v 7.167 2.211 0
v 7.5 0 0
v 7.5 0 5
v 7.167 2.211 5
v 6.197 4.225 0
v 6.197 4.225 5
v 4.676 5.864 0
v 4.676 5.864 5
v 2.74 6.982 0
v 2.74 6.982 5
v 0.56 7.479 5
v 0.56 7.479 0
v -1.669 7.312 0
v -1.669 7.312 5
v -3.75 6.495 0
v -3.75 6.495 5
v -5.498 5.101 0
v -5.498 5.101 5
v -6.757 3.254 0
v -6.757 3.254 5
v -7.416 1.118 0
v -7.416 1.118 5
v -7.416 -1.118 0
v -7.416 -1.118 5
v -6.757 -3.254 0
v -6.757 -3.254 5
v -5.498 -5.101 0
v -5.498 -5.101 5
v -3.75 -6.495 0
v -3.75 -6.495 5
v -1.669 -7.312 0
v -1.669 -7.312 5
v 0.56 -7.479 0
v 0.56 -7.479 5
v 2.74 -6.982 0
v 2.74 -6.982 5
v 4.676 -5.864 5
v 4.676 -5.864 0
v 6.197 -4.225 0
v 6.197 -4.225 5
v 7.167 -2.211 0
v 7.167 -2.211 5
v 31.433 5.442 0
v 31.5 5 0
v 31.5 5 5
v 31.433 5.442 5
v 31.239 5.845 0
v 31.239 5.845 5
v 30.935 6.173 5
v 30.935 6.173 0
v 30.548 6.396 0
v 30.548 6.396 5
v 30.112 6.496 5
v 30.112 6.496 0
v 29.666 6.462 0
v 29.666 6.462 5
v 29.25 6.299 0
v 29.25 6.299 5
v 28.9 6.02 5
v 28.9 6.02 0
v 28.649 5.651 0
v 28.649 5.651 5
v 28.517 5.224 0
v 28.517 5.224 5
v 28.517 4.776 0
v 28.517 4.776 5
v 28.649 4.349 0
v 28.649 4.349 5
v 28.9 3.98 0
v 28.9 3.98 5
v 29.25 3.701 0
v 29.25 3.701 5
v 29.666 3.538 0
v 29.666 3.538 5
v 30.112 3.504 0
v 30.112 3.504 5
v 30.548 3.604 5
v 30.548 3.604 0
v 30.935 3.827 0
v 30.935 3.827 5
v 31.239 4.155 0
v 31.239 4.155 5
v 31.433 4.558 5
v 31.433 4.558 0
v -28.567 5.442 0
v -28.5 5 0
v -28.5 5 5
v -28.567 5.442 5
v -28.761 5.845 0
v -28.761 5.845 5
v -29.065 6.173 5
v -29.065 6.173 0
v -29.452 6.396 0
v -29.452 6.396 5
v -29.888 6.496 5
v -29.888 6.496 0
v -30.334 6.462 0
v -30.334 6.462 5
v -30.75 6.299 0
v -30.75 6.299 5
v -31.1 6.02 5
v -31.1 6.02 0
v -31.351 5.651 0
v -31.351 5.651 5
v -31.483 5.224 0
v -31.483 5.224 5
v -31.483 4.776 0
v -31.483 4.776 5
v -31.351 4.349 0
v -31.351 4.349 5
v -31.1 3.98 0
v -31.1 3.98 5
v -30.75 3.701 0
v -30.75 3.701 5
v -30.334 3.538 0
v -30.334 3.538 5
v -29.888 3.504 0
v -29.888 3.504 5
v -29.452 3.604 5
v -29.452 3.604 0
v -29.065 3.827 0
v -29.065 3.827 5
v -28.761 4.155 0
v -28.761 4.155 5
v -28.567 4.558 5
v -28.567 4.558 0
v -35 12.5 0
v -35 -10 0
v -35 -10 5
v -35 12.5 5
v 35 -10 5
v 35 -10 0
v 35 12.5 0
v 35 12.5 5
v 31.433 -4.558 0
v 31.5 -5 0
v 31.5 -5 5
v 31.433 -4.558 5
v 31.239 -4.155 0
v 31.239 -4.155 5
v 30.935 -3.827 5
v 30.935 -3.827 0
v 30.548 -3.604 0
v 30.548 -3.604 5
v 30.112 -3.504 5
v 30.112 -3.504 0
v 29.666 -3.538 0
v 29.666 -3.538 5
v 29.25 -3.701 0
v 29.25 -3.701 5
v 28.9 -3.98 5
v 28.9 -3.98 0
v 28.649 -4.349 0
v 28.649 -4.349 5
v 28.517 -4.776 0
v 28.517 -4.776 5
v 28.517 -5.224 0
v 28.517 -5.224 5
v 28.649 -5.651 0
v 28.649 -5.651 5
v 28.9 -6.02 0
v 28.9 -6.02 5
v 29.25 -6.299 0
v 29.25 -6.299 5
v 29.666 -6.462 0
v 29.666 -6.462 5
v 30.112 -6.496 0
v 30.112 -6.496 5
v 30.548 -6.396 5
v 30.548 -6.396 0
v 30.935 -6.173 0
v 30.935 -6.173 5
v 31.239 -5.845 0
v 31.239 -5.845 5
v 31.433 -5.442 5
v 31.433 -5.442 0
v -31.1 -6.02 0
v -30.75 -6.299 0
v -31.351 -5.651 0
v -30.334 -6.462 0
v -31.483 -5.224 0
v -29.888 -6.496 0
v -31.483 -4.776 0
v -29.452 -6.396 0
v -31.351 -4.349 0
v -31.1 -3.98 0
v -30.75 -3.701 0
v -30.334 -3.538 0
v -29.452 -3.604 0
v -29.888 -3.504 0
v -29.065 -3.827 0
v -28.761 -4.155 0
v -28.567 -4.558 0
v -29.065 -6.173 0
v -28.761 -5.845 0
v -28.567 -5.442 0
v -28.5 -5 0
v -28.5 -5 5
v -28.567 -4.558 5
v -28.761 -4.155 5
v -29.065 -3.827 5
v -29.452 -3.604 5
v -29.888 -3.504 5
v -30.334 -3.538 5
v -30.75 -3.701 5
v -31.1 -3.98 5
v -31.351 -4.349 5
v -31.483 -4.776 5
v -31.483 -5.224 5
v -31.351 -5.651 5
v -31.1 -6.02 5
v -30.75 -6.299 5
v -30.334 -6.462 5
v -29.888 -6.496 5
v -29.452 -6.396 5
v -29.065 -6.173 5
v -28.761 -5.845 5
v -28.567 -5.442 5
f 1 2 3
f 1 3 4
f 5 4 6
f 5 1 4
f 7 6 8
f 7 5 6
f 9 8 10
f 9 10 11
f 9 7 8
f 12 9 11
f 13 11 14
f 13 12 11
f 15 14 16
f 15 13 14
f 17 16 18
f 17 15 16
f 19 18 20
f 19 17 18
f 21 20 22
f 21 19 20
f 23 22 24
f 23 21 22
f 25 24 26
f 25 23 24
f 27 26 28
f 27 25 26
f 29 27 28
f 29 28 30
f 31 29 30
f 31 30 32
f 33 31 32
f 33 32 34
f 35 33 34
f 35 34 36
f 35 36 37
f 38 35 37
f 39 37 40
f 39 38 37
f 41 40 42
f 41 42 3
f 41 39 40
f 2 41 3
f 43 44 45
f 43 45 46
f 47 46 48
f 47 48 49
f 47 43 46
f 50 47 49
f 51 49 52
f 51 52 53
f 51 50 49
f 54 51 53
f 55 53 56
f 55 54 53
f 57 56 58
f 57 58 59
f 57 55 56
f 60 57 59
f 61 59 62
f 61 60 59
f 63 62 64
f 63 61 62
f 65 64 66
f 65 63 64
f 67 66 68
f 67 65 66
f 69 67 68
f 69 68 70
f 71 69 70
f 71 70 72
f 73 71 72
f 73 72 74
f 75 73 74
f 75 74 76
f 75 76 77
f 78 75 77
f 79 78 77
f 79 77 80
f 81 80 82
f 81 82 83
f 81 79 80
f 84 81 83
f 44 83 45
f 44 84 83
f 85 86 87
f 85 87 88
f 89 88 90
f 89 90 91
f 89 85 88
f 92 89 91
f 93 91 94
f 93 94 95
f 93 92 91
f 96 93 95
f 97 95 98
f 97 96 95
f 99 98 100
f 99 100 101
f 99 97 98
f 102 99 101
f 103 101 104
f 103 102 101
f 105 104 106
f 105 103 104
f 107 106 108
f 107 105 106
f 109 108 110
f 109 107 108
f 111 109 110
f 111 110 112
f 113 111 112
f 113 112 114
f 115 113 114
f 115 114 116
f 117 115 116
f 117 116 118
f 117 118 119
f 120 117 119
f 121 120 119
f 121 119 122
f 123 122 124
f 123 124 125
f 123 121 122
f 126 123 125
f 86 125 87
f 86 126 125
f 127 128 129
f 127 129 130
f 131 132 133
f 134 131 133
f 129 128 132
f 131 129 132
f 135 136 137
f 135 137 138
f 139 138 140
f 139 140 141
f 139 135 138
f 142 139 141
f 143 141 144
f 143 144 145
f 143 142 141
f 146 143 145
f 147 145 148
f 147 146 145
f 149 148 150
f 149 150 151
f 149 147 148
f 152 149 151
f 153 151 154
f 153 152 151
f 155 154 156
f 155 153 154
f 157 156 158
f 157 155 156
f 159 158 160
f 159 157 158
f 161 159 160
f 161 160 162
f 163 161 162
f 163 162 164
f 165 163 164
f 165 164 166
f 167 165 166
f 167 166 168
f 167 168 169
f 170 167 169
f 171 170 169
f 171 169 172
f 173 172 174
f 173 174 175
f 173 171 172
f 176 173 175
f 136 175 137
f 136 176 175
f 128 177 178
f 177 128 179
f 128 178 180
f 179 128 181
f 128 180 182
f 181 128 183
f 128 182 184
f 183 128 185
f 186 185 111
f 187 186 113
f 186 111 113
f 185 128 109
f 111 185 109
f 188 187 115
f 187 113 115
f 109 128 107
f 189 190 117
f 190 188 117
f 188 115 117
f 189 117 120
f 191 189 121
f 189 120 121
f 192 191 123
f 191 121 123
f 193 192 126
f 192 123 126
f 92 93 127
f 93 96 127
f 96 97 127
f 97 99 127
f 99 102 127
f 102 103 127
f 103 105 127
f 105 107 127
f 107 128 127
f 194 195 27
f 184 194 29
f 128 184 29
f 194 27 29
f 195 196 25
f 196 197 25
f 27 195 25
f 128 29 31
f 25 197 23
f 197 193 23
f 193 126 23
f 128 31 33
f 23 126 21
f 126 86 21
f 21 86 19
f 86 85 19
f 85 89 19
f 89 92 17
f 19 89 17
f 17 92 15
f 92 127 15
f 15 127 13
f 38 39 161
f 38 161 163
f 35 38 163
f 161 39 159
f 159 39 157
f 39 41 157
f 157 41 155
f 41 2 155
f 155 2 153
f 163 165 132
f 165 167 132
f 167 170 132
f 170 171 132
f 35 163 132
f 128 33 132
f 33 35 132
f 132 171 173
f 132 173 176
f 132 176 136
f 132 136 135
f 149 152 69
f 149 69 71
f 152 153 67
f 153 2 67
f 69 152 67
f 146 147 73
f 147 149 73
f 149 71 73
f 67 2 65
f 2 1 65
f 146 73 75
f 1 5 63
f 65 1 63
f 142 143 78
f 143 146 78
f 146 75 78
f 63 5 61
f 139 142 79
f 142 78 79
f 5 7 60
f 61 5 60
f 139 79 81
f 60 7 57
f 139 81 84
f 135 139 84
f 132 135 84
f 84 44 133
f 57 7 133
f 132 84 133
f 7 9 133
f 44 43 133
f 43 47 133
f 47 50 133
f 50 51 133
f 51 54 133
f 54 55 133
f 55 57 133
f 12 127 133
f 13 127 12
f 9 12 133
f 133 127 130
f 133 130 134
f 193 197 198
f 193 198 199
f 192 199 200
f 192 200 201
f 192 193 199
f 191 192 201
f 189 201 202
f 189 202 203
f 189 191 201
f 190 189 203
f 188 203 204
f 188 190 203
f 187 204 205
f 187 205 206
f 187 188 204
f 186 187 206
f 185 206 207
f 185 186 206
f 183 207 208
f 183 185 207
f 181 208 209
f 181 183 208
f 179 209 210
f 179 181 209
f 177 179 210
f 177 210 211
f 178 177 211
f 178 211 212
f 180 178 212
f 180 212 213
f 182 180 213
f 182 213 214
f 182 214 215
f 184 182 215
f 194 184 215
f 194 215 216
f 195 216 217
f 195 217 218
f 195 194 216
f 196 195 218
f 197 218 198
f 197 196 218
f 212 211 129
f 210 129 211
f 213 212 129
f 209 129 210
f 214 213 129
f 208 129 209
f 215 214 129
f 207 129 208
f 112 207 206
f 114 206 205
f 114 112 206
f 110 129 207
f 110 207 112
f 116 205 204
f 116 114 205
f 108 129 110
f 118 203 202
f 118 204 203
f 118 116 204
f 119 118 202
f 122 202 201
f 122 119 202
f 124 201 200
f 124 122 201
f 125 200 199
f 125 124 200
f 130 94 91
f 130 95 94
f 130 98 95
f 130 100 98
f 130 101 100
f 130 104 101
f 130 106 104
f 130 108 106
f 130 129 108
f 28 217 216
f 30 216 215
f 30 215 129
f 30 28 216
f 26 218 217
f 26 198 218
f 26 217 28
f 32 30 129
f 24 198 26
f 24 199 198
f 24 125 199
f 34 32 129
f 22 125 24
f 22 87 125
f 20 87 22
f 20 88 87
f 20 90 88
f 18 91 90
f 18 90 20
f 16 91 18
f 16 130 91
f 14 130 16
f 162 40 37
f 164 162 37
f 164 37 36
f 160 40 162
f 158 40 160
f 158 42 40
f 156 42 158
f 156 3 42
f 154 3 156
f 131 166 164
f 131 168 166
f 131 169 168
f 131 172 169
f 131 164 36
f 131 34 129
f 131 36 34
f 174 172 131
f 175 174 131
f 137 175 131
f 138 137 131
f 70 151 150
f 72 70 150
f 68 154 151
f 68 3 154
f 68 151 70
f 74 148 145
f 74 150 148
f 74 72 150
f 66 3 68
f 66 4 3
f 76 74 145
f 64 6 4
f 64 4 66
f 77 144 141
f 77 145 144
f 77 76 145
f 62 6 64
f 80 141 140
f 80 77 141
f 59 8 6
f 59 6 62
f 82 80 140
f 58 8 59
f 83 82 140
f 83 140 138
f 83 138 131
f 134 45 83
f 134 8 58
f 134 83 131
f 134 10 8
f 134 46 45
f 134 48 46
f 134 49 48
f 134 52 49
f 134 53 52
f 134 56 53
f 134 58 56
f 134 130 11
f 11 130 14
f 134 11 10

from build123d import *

# Parameters (mm, degrees)
ESQUISSE1_W        = 70
ESQUISSE1_H        = 22.5
ESQUISSE1_R        = 7.5
ESQUISSE1_R_2      = 1.5
BOSS_EXTRU_1_DEPTH = 5


with BuildPart() as part:
    # Esquisse1 → Boss.-Extru.1 (new body)
    with BuildSketch(Plane.XY):
        with Locations((0, 1.25)):
            Rectangle(ESQUISSE1_W, ESQUISSE1_H)
        Circle(ESQUISSE1_R, mode=Mode.SUBTRACT)
        with Locations((30, -5)):
            Circle(ESQUISSE1_R_2, mode=Mode.SUBTRACT)
        with Locations((30, 5)):
            Circle(ESQUISSE1_R_2, mode=Mode.SUBTRACT)
        with Locations((-30, 5)):
            Circle(ESQUISSE1_R_2, mode=Mode.SUBTRACT)
        with Locations((-30, -5)):
            Circle(ESQUISSE1_R_2, mode=Mode.SUBTRACT)
    extrude(amount=BOSS_EXTRU_1_DEPTH)


solid = part.part
